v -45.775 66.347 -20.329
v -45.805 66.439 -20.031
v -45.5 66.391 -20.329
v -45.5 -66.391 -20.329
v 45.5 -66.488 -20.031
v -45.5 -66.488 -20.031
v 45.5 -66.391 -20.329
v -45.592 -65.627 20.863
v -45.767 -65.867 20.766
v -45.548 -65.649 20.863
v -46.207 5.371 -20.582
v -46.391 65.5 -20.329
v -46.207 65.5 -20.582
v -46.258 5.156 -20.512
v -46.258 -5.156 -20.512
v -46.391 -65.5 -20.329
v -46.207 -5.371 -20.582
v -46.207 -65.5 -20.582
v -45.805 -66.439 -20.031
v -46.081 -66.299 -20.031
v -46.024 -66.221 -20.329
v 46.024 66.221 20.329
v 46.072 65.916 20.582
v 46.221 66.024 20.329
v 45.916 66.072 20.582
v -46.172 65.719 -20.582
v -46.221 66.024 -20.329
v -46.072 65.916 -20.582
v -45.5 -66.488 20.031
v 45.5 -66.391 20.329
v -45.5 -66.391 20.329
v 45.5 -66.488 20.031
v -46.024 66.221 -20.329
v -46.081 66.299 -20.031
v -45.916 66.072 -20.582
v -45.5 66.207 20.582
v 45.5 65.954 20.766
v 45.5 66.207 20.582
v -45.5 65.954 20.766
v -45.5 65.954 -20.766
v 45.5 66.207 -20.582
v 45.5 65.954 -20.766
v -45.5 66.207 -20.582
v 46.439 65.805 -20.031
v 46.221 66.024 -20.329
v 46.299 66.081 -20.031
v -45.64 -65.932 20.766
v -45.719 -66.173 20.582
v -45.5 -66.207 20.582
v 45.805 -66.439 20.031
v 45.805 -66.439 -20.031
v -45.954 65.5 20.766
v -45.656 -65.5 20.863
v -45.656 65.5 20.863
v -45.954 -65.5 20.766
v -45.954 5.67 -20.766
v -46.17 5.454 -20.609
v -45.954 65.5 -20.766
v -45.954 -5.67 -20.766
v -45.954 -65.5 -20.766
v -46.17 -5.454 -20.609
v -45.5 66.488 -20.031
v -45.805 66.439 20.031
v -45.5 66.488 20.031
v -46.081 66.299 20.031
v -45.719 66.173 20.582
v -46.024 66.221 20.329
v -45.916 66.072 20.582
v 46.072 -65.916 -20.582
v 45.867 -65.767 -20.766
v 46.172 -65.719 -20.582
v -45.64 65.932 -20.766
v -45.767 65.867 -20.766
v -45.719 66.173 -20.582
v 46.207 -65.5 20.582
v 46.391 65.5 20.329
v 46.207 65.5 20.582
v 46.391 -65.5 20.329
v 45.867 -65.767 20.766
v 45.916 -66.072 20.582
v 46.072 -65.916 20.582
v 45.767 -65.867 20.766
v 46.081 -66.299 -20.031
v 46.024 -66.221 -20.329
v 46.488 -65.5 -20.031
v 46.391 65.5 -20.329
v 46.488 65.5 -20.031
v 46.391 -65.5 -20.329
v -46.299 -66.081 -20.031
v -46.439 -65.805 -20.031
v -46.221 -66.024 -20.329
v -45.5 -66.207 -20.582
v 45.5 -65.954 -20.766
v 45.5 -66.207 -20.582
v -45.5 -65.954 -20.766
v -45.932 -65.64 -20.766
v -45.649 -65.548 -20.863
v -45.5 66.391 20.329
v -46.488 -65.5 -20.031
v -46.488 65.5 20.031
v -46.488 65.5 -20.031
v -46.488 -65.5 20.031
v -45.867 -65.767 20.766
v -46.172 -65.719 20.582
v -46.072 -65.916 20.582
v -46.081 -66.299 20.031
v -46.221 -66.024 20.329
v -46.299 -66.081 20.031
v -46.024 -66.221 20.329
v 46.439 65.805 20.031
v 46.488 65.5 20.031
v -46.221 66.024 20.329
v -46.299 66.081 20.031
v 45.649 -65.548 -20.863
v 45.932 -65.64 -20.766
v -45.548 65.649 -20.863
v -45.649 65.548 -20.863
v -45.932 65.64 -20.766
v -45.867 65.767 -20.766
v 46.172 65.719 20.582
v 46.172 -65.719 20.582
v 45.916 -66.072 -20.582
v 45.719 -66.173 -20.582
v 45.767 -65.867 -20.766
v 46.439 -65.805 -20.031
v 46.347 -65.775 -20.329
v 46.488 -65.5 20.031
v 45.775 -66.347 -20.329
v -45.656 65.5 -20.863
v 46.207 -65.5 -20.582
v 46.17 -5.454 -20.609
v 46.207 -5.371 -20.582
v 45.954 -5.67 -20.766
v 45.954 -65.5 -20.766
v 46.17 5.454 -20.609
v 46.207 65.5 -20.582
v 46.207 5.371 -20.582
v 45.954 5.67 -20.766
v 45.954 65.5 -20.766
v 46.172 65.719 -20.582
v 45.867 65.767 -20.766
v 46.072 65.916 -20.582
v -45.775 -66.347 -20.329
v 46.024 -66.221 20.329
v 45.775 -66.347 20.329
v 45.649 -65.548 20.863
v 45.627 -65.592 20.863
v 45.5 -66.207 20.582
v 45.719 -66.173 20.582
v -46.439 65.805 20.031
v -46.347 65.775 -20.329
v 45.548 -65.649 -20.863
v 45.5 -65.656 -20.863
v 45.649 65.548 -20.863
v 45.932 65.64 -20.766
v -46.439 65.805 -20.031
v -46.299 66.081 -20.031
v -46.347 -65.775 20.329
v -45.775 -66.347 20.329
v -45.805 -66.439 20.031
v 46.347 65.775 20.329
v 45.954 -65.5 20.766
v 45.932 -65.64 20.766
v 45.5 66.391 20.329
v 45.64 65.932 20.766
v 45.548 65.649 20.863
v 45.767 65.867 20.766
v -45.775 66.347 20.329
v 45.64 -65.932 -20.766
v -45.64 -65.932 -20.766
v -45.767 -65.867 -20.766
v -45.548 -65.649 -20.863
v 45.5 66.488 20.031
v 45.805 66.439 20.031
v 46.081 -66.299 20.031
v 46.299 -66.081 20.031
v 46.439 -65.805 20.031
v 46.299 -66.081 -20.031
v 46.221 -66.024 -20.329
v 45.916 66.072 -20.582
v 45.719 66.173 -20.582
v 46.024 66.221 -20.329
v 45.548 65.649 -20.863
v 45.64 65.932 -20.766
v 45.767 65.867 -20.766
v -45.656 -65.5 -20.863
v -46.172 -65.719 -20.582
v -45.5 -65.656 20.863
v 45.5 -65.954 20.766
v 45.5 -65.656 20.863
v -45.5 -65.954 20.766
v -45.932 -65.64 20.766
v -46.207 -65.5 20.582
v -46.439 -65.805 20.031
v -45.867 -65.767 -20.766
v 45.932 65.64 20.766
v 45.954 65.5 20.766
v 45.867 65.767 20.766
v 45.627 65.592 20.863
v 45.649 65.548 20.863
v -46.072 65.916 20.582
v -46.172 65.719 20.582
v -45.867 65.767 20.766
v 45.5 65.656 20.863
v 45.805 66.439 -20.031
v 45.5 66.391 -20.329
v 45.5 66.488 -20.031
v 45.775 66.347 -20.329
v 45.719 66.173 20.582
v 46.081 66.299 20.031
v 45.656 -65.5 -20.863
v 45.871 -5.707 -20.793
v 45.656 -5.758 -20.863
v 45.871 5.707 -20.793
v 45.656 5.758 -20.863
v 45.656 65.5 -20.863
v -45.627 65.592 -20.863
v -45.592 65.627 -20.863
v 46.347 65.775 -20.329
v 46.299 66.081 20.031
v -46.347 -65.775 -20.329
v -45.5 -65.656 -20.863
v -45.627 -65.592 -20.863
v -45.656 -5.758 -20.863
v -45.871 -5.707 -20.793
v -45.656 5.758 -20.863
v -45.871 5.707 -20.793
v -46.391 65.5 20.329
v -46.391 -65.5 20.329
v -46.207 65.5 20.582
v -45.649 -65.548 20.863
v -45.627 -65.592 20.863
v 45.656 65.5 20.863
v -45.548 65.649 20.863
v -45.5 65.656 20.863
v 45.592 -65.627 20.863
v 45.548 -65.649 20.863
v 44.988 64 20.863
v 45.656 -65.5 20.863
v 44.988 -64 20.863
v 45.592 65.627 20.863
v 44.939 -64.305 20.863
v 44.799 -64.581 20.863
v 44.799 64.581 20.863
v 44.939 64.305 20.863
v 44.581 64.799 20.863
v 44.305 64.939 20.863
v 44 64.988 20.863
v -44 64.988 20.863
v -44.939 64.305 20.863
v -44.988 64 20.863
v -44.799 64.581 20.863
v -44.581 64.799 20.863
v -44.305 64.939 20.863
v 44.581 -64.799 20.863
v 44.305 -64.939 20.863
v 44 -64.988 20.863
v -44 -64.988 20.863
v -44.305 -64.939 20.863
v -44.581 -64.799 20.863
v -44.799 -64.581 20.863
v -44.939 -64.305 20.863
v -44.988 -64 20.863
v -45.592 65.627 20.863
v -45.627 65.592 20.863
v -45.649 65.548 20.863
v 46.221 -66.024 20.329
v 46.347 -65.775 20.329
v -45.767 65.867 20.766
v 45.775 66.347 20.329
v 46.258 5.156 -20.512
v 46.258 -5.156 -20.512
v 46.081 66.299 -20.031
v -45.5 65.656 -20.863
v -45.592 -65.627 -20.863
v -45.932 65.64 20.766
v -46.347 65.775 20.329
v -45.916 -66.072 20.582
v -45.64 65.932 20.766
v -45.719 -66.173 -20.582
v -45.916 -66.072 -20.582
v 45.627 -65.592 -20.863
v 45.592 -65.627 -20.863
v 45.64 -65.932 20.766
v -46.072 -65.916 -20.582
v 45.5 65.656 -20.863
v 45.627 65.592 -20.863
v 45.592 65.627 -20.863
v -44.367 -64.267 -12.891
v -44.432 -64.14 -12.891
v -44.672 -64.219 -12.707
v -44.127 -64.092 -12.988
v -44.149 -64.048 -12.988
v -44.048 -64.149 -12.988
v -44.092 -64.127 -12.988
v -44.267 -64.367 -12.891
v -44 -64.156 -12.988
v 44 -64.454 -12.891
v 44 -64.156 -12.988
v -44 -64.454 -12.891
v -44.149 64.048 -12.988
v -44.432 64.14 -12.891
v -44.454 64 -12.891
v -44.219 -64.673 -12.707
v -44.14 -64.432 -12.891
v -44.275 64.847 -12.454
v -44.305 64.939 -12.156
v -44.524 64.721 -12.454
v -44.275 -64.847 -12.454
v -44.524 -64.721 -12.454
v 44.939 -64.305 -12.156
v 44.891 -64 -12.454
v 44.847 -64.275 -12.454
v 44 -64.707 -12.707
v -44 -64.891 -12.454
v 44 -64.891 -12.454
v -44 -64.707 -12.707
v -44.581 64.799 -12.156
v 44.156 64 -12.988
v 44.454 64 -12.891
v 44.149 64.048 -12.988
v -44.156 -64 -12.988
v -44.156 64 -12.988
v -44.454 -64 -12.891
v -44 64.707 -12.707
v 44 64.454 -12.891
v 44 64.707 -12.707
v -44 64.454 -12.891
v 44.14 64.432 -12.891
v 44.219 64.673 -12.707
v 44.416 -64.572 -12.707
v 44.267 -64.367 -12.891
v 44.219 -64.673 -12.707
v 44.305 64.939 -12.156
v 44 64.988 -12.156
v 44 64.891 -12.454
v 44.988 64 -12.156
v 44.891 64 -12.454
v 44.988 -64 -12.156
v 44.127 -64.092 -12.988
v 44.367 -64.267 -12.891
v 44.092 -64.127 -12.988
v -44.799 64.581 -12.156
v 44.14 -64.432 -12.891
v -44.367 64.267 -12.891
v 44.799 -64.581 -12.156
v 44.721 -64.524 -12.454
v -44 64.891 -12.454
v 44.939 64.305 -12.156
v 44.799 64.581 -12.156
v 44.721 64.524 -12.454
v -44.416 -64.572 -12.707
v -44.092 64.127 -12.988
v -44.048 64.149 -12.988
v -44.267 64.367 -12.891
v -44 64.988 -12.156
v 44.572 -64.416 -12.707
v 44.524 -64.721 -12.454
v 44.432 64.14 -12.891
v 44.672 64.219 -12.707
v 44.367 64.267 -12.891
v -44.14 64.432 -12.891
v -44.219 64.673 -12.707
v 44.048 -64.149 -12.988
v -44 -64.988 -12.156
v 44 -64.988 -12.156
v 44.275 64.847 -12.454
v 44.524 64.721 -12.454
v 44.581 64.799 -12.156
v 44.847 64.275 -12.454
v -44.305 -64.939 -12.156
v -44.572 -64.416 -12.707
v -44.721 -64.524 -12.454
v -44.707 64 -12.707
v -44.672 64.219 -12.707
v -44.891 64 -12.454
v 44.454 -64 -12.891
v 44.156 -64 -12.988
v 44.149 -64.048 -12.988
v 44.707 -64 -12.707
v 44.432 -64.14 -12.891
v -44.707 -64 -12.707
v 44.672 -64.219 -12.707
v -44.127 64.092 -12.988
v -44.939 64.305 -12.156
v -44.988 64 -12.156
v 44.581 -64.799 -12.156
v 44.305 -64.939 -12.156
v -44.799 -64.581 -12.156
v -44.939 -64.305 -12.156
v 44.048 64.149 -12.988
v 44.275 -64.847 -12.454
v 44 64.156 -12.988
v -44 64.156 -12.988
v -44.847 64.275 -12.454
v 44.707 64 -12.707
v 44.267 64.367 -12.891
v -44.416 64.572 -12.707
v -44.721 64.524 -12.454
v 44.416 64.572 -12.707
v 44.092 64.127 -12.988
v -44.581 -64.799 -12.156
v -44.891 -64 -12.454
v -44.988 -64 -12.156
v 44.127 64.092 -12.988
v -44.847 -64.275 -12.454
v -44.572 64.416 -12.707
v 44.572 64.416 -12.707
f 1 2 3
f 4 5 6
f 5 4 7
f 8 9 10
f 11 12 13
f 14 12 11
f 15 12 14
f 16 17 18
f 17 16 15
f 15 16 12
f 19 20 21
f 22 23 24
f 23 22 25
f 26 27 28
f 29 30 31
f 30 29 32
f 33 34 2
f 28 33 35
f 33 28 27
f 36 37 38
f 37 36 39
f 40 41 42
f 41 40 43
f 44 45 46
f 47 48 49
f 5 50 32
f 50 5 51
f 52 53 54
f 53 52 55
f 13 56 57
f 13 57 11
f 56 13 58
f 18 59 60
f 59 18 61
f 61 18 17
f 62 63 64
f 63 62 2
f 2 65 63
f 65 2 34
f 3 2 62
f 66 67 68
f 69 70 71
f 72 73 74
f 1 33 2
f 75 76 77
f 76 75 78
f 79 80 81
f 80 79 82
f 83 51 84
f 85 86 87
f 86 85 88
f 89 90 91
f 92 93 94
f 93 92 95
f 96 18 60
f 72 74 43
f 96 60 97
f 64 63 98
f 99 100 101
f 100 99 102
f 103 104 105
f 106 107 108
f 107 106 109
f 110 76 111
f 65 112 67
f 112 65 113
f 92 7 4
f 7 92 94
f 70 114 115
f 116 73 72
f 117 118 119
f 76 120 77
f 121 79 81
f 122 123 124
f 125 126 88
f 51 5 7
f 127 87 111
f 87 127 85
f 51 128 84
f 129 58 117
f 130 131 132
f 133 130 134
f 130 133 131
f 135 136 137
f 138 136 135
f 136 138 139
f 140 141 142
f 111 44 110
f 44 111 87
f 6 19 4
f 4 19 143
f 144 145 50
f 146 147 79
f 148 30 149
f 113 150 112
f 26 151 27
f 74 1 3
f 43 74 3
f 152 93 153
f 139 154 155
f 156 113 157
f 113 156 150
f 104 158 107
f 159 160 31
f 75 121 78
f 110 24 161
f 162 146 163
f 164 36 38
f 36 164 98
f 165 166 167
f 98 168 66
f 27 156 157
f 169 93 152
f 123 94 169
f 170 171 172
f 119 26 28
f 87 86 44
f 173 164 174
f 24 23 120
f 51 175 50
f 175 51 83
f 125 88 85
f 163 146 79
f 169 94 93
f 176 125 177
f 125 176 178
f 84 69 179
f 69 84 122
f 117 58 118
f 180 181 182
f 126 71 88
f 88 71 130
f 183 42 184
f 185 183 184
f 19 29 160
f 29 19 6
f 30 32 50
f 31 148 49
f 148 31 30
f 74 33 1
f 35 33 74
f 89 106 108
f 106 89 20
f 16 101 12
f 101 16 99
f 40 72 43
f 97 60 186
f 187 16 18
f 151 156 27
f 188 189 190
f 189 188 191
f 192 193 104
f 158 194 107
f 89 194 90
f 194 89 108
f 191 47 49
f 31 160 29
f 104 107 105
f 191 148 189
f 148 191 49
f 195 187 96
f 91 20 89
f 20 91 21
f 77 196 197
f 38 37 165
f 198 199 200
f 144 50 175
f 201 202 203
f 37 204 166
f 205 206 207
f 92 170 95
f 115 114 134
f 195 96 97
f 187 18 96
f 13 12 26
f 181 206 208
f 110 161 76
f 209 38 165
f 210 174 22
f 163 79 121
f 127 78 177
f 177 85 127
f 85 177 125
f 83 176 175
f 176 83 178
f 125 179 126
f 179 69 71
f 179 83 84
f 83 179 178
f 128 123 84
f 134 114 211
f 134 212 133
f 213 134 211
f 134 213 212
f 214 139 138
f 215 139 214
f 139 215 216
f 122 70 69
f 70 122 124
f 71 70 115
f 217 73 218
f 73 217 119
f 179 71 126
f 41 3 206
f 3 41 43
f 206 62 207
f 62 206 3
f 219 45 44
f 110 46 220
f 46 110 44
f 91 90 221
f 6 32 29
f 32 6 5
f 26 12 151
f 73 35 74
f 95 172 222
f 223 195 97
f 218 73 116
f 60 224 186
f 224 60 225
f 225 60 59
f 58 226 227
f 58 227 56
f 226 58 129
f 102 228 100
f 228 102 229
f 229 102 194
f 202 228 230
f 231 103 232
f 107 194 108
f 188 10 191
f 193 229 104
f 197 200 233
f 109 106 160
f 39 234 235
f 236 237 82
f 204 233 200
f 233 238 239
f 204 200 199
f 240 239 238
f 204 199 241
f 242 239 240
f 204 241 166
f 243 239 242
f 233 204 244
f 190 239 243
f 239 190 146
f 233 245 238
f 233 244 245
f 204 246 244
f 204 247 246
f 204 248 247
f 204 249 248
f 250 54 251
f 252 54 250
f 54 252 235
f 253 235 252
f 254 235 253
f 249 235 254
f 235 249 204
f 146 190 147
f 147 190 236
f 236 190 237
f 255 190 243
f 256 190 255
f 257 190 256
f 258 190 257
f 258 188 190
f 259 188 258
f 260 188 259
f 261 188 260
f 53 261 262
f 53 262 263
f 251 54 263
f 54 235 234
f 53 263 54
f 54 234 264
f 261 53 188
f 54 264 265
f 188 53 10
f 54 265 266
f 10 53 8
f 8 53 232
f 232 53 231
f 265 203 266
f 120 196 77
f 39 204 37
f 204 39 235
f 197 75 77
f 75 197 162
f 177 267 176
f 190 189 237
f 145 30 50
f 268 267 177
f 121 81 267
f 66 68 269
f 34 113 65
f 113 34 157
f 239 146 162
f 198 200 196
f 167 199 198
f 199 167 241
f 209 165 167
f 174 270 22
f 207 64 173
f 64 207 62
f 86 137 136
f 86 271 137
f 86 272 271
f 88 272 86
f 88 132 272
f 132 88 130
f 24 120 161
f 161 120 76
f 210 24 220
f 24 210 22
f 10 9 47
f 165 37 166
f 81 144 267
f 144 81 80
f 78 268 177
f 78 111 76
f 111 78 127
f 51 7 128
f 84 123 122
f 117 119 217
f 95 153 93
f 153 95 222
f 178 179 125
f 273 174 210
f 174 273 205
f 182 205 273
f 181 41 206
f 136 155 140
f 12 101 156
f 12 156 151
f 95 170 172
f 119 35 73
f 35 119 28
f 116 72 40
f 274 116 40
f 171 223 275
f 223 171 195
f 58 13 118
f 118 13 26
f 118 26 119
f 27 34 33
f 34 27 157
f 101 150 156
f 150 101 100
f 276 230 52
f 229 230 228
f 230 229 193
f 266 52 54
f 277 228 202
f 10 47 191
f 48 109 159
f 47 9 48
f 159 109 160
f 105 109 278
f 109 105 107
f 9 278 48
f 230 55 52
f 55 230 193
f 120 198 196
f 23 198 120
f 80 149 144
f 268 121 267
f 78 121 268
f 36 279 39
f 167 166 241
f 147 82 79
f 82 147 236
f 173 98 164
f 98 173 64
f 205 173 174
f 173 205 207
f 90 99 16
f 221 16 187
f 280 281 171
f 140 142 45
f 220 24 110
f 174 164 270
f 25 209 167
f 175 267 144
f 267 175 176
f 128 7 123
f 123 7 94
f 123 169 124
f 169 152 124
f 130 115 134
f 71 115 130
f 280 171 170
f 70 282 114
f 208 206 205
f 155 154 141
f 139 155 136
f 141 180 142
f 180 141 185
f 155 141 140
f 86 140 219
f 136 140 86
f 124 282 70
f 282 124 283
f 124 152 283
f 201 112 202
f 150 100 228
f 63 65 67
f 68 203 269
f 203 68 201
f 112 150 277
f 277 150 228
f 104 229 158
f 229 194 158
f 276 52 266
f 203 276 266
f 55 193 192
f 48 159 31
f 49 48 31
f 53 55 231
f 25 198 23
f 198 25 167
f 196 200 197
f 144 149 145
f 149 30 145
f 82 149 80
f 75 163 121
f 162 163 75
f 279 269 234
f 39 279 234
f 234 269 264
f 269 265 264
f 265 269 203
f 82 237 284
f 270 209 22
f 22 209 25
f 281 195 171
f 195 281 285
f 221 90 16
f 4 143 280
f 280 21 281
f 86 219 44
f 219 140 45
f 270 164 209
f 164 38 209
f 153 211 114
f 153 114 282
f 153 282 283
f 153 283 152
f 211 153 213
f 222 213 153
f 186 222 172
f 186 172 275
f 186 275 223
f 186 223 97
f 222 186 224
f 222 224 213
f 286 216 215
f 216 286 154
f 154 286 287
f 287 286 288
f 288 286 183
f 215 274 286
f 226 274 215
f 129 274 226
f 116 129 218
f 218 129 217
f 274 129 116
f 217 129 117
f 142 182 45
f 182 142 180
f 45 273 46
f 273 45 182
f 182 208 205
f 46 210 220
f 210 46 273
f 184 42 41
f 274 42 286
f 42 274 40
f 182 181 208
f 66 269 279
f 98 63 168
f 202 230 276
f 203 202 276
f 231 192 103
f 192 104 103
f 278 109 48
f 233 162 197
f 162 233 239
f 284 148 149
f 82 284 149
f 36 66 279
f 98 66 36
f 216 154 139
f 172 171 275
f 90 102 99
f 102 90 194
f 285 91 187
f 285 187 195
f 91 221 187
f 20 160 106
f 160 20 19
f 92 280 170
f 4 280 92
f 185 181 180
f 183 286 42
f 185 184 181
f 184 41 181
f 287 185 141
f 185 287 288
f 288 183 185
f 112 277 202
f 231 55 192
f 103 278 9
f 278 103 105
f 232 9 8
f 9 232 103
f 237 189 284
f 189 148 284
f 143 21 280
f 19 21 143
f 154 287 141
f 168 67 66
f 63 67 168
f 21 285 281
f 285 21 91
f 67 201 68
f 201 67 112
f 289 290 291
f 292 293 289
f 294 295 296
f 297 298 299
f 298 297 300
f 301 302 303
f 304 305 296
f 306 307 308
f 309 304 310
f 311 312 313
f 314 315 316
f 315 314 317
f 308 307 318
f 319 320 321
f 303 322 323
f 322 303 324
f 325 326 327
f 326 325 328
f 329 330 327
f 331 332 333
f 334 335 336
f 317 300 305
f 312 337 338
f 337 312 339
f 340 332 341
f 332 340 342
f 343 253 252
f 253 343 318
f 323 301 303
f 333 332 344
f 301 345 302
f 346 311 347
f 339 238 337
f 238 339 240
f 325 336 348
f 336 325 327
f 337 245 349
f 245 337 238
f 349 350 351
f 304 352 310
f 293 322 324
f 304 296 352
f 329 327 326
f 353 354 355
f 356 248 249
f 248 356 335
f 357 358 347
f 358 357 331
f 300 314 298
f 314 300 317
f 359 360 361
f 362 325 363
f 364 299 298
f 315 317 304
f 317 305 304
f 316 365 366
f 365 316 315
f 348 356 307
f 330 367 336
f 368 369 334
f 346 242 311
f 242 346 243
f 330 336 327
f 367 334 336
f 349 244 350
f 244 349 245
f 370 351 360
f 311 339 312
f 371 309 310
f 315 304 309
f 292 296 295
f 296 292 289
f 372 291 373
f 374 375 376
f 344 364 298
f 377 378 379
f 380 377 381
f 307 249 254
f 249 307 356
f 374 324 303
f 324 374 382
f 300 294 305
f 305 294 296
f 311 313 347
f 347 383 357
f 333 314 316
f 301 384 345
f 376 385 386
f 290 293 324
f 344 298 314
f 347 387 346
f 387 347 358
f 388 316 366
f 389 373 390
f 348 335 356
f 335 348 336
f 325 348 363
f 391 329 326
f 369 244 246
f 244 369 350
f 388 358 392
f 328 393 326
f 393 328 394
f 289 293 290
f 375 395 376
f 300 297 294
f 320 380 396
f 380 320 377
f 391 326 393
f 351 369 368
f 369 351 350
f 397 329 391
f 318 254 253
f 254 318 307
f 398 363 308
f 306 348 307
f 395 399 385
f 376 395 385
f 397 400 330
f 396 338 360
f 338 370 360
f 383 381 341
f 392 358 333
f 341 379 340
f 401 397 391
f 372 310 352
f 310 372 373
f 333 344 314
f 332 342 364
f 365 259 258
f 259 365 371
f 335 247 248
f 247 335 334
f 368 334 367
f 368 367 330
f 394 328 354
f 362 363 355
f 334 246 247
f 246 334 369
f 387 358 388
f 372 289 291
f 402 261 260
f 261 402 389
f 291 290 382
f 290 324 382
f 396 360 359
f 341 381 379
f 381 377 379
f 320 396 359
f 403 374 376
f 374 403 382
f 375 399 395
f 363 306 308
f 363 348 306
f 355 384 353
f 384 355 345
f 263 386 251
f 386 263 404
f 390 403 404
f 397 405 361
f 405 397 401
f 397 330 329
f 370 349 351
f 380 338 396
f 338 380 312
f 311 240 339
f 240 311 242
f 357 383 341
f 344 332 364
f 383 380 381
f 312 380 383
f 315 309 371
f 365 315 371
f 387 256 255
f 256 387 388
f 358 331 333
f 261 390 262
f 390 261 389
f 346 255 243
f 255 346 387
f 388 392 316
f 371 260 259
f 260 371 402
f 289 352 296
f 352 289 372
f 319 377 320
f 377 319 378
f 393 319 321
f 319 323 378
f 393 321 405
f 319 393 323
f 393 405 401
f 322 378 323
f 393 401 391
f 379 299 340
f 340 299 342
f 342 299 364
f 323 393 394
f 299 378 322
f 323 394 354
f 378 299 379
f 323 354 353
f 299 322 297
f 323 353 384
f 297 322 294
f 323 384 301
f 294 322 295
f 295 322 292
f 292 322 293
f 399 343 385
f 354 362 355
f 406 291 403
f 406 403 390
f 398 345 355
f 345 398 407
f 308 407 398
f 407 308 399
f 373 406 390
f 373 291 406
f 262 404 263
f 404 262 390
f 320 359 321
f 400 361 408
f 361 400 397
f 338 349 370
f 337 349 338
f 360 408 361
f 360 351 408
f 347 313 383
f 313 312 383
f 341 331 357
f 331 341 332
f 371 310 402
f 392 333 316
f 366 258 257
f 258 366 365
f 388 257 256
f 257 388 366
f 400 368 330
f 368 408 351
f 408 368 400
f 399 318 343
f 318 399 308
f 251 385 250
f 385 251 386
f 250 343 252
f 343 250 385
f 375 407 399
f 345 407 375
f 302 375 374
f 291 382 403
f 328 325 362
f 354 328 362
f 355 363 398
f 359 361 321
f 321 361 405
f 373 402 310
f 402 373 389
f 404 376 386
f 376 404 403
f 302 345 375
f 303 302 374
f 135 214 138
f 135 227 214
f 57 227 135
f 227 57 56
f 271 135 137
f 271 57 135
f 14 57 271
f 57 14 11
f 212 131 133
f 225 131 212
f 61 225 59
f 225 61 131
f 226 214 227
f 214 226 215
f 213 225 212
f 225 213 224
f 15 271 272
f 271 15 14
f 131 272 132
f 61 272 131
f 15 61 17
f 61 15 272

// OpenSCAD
// file: defines.scad
// Externally measured from box. This is the Internal dimensions reqiured for
// the box more or less

LENGTH = 130; // mm
WIDTH  =  90; // mm
HEIGHT =  38; // mm
WALL   =   3; // mm
STRAP  =  12; // mm
RADIUS =   1; // mm

BUFFER = 0.5; // mm - Buffer amount for the lid to make it fit proper

// The wall width must be smaller than the height

module rounded_cube1(dim, r, center=false) {
    scalar = [2*r, 2*r, 2*r];
    assert(dim > scalar);

    minkowski() {
        cube(dim-scalar, center=center);
        sphere(r, $fn=20);
    }
}
// main file
include <defines.scad>

module bottom(width, length, height, wall, strap_width, radius=1) {
    assert(wall > 2*radius);
    difference() {
        rounded_cube1([width+wall, length+wall, height+wall+wall/4], radius, center=true);
        translate([0, 0, wall+wall]) rounded_cube1([width, length, height], radius, center=true);

        translate([0, 0, -height/2-wall]) {
            rounded_cube1([width+wall+wall, strap_width, wall], radius, center=true);
        }
    }
}

bottom(WIDTH, LENGTH, HEIGHT, WALL, STRAP, RADIUS);
